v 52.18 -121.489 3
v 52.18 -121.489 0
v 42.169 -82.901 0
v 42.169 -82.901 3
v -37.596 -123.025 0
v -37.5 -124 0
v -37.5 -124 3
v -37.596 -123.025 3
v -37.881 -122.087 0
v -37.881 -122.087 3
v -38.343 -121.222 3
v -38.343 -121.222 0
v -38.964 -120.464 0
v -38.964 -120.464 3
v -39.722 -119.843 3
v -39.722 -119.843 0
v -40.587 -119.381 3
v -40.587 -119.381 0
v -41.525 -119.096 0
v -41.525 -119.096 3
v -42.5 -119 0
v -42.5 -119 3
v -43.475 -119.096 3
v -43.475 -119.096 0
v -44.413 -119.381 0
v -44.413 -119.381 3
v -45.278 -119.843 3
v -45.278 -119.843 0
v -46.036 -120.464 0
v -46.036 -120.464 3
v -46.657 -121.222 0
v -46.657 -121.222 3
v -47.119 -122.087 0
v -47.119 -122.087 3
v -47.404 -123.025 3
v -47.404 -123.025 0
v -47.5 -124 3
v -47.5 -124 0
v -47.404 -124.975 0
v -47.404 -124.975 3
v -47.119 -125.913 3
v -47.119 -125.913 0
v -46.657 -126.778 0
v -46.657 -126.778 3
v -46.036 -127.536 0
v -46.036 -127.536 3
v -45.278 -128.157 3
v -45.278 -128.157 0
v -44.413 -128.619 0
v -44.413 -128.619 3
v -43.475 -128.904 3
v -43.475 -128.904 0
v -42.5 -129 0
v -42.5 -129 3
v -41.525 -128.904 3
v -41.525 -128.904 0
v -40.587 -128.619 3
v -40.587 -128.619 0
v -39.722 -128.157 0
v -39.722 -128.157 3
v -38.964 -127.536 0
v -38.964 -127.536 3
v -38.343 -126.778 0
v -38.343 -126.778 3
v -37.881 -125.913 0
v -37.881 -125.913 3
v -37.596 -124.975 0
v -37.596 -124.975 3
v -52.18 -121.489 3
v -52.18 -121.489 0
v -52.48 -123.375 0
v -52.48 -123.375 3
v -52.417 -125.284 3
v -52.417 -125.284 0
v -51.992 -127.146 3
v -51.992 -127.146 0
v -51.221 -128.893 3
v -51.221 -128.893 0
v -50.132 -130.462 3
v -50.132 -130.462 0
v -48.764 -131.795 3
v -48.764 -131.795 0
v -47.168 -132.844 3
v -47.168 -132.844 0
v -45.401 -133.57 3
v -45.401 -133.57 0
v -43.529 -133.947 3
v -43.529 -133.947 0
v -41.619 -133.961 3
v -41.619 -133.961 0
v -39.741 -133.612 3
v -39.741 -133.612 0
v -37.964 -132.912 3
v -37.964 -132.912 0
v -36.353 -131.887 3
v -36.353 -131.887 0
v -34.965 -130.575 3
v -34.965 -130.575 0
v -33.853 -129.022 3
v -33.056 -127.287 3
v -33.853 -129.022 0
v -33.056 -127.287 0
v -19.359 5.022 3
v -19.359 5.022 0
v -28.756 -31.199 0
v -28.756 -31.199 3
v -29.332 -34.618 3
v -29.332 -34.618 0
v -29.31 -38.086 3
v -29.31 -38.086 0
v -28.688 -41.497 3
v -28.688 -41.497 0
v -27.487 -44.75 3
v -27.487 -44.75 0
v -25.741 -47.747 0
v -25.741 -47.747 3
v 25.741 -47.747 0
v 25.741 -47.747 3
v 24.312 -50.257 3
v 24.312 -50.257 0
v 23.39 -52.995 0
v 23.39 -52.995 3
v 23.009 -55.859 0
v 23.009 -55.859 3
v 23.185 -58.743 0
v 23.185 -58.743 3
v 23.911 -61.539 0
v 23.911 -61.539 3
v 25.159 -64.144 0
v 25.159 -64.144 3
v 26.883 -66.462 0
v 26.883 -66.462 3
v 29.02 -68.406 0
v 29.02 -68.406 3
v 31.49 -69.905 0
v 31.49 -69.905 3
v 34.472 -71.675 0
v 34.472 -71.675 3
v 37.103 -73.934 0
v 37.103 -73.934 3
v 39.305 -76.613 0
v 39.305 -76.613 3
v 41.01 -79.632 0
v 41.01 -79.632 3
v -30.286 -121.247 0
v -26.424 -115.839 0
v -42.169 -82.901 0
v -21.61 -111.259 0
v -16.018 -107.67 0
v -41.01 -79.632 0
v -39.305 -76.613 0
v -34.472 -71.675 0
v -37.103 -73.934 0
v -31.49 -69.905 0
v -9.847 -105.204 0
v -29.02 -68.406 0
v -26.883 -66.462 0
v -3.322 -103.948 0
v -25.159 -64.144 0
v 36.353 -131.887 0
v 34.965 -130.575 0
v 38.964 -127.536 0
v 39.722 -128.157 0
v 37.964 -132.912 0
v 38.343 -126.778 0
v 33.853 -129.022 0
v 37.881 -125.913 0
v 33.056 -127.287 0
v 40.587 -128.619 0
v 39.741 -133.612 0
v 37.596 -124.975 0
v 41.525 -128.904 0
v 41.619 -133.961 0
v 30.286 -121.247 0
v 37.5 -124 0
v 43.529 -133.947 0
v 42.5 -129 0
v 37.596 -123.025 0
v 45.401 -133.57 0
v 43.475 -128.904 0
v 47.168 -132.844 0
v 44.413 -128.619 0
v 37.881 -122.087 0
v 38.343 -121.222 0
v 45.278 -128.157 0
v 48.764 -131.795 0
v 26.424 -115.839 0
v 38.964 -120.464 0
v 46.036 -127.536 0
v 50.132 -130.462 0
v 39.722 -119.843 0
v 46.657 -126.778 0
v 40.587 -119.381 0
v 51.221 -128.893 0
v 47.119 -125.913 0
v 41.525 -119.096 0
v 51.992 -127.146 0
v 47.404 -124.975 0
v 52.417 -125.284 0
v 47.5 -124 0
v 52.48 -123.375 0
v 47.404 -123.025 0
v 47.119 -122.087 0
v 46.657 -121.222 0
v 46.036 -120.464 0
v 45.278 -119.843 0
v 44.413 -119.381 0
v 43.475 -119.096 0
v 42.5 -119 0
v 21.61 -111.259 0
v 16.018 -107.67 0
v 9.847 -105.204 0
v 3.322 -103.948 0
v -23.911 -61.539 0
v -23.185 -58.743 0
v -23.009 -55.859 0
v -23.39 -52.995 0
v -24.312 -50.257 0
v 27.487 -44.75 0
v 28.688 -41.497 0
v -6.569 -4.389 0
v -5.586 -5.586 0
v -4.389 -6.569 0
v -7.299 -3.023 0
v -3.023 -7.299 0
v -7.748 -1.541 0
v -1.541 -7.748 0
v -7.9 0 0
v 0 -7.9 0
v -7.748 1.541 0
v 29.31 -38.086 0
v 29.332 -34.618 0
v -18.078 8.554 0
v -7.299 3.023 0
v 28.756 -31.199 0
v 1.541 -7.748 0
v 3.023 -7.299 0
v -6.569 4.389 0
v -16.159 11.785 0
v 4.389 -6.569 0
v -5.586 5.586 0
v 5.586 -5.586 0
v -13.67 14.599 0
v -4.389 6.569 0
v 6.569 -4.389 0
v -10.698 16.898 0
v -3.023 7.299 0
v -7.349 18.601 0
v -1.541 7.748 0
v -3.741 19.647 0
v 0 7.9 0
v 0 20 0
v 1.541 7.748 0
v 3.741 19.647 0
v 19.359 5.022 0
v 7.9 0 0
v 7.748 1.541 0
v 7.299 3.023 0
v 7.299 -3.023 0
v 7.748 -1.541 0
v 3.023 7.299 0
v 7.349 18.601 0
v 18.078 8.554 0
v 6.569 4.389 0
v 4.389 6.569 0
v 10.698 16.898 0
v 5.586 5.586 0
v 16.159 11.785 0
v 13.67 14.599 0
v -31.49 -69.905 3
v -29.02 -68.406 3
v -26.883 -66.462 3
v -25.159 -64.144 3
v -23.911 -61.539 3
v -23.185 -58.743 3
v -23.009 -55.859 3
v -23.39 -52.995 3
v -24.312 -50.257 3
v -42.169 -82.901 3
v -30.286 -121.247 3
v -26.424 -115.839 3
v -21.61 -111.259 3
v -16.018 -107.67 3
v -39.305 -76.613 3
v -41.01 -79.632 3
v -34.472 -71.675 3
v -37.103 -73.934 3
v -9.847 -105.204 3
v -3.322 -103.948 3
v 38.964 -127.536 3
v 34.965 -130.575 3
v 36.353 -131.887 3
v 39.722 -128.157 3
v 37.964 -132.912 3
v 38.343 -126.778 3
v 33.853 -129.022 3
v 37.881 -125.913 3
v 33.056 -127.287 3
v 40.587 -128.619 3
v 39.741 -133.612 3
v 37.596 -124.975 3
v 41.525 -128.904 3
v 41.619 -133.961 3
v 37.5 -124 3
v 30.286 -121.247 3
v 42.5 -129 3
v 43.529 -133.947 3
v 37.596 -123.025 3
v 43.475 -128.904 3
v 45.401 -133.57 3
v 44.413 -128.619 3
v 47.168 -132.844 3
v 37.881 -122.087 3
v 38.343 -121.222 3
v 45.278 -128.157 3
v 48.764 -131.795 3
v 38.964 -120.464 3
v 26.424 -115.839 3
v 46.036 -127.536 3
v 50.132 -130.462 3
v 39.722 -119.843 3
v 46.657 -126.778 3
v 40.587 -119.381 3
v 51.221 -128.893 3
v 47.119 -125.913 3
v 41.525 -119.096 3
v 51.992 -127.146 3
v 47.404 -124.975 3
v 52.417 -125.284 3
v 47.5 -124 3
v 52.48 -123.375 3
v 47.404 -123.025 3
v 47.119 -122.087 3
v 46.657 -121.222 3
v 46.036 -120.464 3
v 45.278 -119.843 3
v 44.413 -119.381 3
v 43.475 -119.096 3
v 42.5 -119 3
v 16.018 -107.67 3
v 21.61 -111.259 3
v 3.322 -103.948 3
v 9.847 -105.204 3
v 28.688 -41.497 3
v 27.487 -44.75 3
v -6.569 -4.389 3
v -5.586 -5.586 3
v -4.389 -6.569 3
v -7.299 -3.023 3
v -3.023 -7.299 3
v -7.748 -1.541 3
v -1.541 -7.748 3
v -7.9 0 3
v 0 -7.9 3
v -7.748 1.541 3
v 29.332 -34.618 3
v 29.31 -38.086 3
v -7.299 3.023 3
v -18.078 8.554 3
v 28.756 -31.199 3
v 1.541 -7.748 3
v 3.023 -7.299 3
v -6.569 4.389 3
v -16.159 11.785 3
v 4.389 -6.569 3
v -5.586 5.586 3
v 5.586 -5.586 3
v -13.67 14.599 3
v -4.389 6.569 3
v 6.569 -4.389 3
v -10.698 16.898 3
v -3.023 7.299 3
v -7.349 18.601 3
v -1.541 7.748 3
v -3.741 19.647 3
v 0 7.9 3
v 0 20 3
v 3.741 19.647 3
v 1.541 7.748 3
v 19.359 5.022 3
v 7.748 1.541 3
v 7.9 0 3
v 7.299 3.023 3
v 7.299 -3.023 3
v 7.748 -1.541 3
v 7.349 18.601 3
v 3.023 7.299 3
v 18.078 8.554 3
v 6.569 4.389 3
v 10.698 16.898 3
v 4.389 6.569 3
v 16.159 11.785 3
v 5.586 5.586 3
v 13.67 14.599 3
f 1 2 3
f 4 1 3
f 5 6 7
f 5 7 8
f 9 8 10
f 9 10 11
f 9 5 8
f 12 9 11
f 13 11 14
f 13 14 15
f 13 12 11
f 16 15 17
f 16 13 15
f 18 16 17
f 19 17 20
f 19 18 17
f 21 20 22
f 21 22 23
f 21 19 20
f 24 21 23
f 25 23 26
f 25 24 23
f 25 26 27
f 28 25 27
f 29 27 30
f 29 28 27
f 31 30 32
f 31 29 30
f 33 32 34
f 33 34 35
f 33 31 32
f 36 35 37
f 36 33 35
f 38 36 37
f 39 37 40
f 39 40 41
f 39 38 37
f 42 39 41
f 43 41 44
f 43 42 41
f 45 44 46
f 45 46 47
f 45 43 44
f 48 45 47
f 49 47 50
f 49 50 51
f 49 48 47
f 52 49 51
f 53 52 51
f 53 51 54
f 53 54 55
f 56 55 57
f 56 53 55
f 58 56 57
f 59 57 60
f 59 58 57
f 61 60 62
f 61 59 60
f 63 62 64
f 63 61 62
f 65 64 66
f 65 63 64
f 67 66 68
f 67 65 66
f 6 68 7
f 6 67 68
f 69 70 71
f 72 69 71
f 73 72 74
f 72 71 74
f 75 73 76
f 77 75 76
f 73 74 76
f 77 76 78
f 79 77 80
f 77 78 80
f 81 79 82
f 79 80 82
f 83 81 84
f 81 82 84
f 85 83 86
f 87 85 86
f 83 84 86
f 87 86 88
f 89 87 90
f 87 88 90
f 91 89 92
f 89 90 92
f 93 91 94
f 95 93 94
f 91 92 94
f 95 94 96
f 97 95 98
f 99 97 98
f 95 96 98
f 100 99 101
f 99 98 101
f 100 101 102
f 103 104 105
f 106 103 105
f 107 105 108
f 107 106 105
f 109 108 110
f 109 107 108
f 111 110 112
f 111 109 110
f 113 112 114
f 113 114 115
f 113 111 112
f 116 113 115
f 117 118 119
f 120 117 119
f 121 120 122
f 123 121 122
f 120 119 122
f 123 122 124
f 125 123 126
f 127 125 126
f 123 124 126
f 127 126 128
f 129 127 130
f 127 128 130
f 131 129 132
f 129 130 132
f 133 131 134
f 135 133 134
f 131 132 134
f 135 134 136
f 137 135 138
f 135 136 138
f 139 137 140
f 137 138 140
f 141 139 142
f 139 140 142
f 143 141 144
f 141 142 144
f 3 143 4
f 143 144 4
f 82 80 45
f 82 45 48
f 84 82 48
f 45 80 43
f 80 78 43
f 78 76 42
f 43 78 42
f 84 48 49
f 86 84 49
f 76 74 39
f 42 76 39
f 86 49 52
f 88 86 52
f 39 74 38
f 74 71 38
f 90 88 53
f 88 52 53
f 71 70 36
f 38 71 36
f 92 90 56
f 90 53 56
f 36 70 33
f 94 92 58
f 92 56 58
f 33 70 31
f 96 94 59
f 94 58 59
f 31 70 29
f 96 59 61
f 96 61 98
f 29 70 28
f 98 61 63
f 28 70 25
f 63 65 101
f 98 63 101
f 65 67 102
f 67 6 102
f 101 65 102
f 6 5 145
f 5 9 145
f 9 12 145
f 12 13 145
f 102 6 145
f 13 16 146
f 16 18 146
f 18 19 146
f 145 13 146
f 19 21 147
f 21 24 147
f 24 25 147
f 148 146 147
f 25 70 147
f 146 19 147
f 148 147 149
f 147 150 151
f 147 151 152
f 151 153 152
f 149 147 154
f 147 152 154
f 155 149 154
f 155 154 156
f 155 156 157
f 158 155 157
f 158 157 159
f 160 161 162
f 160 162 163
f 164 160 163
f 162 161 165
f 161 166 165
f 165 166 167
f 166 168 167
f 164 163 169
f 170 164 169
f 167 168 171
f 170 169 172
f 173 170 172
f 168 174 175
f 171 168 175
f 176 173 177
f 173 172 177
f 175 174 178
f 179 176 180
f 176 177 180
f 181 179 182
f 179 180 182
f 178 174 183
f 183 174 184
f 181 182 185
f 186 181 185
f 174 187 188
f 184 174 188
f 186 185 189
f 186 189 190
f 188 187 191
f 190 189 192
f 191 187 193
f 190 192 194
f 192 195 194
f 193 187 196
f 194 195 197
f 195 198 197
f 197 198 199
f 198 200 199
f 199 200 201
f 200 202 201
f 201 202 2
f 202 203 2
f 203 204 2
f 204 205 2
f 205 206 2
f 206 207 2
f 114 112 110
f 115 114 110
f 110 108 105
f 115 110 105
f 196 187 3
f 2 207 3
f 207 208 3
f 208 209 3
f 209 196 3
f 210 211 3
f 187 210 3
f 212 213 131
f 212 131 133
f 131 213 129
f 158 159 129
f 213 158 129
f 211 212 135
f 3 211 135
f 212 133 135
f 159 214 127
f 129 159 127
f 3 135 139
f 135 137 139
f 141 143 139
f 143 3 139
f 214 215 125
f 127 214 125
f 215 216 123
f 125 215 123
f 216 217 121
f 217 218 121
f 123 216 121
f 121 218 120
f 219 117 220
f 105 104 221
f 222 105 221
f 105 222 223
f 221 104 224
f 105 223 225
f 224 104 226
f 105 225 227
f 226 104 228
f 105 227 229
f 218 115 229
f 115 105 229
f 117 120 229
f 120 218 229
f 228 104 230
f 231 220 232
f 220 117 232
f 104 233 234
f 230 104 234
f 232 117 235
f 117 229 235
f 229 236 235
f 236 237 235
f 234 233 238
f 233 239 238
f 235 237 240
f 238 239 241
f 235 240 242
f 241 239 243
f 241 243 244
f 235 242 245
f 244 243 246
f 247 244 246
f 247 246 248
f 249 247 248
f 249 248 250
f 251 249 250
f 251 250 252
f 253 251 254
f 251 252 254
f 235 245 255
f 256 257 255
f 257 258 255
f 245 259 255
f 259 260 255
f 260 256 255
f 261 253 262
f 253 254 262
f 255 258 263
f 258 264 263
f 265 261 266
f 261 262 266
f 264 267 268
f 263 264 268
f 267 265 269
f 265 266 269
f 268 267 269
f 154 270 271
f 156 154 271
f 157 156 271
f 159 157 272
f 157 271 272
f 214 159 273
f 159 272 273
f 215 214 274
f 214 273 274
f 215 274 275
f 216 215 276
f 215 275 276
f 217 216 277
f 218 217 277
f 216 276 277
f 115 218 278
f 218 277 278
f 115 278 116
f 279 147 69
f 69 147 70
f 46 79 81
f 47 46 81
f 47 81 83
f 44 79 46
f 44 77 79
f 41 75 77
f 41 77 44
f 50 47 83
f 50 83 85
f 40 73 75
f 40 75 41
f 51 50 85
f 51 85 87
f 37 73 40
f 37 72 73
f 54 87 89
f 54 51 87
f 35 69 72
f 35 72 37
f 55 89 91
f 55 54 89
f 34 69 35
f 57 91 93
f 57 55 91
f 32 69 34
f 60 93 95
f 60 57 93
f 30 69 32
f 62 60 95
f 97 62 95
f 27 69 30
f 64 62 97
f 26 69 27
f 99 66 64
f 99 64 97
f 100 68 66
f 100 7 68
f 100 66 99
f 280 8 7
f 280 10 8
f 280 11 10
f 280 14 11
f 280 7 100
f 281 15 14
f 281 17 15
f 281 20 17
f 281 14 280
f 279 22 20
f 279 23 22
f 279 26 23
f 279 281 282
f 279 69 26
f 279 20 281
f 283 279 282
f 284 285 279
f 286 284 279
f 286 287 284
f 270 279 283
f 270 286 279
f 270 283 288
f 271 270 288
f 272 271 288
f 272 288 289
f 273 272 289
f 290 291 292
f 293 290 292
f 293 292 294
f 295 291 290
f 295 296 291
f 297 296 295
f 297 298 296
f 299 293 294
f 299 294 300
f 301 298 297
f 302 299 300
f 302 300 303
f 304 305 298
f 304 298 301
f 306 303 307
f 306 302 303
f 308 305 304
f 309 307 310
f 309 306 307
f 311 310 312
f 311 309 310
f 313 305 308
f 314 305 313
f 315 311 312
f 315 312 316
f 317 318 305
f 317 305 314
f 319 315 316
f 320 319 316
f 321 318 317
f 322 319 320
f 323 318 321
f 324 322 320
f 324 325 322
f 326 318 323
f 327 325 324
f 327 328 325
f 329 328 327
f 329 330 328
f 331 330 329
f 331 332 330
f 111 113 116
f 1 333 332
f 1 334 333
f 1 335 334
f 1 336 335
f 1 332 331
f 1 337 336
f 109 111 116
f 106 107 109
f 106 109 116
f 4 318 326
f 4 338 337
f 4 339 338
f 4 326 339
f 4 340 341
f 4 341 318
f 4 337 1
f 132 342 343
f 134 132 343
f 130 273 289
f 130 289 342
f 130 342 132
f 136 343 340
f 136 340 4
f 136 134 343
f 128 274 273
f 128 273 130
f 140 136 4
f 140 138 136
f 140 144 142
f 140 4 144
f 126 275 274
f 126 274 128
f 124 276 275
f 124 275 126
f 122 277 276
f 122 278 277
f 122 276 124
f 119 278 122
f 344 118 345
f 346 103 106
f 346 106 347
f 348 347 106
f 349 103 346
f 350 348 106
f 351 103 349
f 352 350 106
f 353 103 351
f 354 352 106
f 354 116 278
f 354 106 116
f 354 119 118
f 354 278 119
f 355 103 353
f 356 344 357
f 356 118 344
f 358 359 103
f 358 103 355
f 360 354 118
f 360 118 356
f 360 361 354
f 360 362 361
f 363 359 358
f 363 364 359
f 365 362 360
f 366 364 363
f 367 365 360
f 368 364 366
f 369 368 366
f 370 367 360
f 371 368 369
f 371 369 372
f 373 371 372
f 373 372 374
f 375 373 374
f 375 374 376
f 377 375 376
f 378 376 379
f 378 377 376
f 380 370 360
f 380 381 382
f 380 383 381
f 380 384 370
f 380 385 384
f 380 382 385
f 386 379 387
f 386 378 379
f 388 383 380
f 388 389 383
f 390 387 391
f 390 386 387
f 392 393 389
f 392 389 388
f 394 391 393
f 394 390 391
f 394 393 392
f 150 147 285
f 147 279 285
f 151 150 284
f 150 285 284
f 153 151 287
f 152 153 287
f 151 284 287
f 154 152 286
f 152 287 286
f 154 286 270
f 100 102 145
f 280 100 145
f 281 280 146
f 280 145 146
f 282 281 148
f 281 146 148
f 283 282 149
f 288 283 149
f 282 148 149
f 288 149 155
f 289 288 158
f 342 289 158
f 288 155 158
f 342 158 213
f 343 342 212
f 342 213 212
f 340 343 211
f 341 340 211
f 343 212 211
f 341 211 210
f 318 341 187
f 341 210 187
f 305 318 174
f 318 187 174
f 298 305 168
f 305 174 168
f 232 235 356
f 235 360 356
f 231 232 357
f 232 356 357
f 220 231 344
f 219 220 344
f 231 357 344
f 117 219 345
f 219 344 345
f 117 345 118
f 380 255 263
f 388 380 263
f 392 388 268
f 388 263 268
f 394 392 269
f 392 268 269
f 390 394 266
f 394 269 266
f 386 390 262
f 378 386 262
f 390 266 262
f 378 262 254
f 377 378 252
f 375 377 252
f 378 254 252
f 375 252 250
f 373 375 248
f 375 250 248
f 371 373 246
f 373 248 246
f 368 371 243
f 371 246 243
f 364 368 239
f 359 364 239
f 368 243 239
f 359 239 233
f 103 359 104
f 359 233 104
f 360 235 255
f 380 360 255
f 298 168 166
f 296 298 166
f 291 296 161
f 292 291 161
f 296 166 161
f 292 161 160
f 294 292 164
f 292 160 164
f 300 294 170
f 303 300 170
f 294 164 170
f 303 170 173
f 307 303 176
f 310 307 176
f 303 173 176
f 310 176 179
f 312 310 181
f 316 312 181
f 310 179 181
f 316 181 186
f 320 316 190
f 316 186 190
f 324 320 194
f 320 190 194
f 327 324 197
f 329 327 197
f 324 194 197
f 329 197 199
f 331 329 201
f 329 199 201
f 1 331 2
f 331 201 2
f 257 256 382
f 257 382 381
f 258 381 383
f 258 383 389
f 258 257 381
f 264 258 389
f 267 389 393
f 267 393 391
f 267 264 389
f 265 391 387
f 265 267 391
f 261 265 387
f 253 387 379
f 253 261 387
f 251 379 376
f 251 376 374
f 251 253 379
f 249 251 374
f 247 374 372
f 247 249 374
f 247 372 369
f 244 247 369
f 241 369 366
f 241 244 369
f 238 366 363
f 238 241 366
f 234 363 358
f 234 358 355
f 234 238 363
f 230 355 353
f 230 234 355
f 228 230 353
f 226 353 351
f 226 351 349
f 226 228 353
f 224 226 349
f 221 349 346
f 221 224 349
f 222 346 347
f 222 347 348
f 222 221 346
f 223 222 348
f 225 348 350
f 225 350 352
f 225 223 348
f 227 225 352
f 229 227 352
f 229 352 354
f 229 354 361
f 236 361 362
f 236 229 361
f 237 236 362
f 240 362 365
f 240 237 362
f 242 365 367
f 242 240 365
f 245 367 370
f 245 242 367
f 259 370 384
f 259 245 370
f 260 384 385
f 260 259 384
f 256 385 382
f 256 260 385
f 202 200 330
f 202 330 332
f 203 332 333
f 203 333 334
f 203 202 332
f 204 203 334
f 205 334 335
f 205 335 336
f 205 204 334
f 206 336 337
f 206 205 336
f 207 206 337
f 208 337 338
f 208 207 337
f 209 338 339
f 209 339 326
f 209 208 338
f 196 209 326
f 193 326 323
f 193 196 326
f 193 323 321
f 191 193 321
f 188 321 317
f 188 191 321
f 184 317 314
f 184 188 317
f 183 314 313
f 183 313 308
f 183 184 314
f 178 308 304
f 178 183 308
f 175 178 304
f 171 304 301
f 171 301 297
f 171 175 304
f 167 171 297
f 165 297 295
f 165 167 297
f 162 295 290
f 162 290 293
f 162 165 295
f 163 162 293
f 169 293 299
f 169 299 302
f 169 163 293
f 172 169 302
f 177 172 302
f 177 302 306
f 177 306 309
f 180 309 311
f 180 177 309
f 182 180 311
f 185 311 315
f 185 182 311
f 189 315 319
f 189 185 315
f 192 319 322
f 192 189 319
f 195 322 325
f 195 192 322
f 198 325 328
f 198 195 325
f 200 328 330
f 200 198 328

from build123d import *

# Parameters (mm, degrees)
SKETCH_1_R          = 7.9
SKETCH_1_R_2        = 5
EXTRUDE_1_DEPTH     = 3
SKETCH_3_R          = 15
CUT_EXTRUDE_2_DEPTH = 4
FILLET_1_R          = 20


with BuildPart() as part:
    # Эскиз1 → Бобышка-Вытянуть1 (new body)
    with BuildSketch(Plane.XY):
        with BuildLine():
            Line((-19.359148134, 5.022288675), (-52.179574067, -121.488855663))
            ThreePointArc((-52.179574067, -121.488855663), (-45.401310581, -133.569869221), (-33.055555556, -127.286710991))
            ThreePointArc((-33.055555556, -127.286710991), (0, -103.790199458), (33.055555556, -127.286710991))
            ThreePointArc((33.055555556, -127.286710991), (45.401310581, -133.569869221), (52.179574067, -121.488855663))
            Line((52.179574067, -121.488855663), (19.359148134, 5.022288675))
            ThreePointArc((19.359148134, 5.022288675), (0, 20), (-19.359148134, 5.022288675))
        make_face()
        Circle(SKETCH_1_R, mode=Mode.SUBTRACT)
        with Locations((-42.5, -124)):
            Circle(SKETCH_1_R_2, mode=Mode.SUBTRACT)
        with Locations((42.5, -124)):
            Circle(SKETCH_1_R_2, mode=Mode.SUBTRACT)
    extrude(amount=EXTRUDE_1_DEPTH)

    # Эскиз3 → Вырез-Вытянуть2 (cut, through all)
    with BuildSketch(Plane.XY.offset(3)):
        with Locations((-38, -56.391488719)):
            Circle(SKETCH_3_R)
        with Locations((38, -56.391488719)):
            Circle(SKETCH_3_R)
    extrude(amount=-CUT_EXTRUDE_2_DEPTH, mode=Mode.SUBTRACT)

    # Скругление1
    fillet_1_edges = [part.edges().sort_by_distance(p)[0] for p in [
        (-39.171079178, -71.345704632, 1.5),
        (-31.7536013, -42.753948498, 1.5),
        (31.7536013, -42.753948498, 1.5),
        (39.171079178, -71.345704632, 1.5),
    ]]
    fillet(fillet_1_edges, radius=FILLET_1_R)


solid = part.part
